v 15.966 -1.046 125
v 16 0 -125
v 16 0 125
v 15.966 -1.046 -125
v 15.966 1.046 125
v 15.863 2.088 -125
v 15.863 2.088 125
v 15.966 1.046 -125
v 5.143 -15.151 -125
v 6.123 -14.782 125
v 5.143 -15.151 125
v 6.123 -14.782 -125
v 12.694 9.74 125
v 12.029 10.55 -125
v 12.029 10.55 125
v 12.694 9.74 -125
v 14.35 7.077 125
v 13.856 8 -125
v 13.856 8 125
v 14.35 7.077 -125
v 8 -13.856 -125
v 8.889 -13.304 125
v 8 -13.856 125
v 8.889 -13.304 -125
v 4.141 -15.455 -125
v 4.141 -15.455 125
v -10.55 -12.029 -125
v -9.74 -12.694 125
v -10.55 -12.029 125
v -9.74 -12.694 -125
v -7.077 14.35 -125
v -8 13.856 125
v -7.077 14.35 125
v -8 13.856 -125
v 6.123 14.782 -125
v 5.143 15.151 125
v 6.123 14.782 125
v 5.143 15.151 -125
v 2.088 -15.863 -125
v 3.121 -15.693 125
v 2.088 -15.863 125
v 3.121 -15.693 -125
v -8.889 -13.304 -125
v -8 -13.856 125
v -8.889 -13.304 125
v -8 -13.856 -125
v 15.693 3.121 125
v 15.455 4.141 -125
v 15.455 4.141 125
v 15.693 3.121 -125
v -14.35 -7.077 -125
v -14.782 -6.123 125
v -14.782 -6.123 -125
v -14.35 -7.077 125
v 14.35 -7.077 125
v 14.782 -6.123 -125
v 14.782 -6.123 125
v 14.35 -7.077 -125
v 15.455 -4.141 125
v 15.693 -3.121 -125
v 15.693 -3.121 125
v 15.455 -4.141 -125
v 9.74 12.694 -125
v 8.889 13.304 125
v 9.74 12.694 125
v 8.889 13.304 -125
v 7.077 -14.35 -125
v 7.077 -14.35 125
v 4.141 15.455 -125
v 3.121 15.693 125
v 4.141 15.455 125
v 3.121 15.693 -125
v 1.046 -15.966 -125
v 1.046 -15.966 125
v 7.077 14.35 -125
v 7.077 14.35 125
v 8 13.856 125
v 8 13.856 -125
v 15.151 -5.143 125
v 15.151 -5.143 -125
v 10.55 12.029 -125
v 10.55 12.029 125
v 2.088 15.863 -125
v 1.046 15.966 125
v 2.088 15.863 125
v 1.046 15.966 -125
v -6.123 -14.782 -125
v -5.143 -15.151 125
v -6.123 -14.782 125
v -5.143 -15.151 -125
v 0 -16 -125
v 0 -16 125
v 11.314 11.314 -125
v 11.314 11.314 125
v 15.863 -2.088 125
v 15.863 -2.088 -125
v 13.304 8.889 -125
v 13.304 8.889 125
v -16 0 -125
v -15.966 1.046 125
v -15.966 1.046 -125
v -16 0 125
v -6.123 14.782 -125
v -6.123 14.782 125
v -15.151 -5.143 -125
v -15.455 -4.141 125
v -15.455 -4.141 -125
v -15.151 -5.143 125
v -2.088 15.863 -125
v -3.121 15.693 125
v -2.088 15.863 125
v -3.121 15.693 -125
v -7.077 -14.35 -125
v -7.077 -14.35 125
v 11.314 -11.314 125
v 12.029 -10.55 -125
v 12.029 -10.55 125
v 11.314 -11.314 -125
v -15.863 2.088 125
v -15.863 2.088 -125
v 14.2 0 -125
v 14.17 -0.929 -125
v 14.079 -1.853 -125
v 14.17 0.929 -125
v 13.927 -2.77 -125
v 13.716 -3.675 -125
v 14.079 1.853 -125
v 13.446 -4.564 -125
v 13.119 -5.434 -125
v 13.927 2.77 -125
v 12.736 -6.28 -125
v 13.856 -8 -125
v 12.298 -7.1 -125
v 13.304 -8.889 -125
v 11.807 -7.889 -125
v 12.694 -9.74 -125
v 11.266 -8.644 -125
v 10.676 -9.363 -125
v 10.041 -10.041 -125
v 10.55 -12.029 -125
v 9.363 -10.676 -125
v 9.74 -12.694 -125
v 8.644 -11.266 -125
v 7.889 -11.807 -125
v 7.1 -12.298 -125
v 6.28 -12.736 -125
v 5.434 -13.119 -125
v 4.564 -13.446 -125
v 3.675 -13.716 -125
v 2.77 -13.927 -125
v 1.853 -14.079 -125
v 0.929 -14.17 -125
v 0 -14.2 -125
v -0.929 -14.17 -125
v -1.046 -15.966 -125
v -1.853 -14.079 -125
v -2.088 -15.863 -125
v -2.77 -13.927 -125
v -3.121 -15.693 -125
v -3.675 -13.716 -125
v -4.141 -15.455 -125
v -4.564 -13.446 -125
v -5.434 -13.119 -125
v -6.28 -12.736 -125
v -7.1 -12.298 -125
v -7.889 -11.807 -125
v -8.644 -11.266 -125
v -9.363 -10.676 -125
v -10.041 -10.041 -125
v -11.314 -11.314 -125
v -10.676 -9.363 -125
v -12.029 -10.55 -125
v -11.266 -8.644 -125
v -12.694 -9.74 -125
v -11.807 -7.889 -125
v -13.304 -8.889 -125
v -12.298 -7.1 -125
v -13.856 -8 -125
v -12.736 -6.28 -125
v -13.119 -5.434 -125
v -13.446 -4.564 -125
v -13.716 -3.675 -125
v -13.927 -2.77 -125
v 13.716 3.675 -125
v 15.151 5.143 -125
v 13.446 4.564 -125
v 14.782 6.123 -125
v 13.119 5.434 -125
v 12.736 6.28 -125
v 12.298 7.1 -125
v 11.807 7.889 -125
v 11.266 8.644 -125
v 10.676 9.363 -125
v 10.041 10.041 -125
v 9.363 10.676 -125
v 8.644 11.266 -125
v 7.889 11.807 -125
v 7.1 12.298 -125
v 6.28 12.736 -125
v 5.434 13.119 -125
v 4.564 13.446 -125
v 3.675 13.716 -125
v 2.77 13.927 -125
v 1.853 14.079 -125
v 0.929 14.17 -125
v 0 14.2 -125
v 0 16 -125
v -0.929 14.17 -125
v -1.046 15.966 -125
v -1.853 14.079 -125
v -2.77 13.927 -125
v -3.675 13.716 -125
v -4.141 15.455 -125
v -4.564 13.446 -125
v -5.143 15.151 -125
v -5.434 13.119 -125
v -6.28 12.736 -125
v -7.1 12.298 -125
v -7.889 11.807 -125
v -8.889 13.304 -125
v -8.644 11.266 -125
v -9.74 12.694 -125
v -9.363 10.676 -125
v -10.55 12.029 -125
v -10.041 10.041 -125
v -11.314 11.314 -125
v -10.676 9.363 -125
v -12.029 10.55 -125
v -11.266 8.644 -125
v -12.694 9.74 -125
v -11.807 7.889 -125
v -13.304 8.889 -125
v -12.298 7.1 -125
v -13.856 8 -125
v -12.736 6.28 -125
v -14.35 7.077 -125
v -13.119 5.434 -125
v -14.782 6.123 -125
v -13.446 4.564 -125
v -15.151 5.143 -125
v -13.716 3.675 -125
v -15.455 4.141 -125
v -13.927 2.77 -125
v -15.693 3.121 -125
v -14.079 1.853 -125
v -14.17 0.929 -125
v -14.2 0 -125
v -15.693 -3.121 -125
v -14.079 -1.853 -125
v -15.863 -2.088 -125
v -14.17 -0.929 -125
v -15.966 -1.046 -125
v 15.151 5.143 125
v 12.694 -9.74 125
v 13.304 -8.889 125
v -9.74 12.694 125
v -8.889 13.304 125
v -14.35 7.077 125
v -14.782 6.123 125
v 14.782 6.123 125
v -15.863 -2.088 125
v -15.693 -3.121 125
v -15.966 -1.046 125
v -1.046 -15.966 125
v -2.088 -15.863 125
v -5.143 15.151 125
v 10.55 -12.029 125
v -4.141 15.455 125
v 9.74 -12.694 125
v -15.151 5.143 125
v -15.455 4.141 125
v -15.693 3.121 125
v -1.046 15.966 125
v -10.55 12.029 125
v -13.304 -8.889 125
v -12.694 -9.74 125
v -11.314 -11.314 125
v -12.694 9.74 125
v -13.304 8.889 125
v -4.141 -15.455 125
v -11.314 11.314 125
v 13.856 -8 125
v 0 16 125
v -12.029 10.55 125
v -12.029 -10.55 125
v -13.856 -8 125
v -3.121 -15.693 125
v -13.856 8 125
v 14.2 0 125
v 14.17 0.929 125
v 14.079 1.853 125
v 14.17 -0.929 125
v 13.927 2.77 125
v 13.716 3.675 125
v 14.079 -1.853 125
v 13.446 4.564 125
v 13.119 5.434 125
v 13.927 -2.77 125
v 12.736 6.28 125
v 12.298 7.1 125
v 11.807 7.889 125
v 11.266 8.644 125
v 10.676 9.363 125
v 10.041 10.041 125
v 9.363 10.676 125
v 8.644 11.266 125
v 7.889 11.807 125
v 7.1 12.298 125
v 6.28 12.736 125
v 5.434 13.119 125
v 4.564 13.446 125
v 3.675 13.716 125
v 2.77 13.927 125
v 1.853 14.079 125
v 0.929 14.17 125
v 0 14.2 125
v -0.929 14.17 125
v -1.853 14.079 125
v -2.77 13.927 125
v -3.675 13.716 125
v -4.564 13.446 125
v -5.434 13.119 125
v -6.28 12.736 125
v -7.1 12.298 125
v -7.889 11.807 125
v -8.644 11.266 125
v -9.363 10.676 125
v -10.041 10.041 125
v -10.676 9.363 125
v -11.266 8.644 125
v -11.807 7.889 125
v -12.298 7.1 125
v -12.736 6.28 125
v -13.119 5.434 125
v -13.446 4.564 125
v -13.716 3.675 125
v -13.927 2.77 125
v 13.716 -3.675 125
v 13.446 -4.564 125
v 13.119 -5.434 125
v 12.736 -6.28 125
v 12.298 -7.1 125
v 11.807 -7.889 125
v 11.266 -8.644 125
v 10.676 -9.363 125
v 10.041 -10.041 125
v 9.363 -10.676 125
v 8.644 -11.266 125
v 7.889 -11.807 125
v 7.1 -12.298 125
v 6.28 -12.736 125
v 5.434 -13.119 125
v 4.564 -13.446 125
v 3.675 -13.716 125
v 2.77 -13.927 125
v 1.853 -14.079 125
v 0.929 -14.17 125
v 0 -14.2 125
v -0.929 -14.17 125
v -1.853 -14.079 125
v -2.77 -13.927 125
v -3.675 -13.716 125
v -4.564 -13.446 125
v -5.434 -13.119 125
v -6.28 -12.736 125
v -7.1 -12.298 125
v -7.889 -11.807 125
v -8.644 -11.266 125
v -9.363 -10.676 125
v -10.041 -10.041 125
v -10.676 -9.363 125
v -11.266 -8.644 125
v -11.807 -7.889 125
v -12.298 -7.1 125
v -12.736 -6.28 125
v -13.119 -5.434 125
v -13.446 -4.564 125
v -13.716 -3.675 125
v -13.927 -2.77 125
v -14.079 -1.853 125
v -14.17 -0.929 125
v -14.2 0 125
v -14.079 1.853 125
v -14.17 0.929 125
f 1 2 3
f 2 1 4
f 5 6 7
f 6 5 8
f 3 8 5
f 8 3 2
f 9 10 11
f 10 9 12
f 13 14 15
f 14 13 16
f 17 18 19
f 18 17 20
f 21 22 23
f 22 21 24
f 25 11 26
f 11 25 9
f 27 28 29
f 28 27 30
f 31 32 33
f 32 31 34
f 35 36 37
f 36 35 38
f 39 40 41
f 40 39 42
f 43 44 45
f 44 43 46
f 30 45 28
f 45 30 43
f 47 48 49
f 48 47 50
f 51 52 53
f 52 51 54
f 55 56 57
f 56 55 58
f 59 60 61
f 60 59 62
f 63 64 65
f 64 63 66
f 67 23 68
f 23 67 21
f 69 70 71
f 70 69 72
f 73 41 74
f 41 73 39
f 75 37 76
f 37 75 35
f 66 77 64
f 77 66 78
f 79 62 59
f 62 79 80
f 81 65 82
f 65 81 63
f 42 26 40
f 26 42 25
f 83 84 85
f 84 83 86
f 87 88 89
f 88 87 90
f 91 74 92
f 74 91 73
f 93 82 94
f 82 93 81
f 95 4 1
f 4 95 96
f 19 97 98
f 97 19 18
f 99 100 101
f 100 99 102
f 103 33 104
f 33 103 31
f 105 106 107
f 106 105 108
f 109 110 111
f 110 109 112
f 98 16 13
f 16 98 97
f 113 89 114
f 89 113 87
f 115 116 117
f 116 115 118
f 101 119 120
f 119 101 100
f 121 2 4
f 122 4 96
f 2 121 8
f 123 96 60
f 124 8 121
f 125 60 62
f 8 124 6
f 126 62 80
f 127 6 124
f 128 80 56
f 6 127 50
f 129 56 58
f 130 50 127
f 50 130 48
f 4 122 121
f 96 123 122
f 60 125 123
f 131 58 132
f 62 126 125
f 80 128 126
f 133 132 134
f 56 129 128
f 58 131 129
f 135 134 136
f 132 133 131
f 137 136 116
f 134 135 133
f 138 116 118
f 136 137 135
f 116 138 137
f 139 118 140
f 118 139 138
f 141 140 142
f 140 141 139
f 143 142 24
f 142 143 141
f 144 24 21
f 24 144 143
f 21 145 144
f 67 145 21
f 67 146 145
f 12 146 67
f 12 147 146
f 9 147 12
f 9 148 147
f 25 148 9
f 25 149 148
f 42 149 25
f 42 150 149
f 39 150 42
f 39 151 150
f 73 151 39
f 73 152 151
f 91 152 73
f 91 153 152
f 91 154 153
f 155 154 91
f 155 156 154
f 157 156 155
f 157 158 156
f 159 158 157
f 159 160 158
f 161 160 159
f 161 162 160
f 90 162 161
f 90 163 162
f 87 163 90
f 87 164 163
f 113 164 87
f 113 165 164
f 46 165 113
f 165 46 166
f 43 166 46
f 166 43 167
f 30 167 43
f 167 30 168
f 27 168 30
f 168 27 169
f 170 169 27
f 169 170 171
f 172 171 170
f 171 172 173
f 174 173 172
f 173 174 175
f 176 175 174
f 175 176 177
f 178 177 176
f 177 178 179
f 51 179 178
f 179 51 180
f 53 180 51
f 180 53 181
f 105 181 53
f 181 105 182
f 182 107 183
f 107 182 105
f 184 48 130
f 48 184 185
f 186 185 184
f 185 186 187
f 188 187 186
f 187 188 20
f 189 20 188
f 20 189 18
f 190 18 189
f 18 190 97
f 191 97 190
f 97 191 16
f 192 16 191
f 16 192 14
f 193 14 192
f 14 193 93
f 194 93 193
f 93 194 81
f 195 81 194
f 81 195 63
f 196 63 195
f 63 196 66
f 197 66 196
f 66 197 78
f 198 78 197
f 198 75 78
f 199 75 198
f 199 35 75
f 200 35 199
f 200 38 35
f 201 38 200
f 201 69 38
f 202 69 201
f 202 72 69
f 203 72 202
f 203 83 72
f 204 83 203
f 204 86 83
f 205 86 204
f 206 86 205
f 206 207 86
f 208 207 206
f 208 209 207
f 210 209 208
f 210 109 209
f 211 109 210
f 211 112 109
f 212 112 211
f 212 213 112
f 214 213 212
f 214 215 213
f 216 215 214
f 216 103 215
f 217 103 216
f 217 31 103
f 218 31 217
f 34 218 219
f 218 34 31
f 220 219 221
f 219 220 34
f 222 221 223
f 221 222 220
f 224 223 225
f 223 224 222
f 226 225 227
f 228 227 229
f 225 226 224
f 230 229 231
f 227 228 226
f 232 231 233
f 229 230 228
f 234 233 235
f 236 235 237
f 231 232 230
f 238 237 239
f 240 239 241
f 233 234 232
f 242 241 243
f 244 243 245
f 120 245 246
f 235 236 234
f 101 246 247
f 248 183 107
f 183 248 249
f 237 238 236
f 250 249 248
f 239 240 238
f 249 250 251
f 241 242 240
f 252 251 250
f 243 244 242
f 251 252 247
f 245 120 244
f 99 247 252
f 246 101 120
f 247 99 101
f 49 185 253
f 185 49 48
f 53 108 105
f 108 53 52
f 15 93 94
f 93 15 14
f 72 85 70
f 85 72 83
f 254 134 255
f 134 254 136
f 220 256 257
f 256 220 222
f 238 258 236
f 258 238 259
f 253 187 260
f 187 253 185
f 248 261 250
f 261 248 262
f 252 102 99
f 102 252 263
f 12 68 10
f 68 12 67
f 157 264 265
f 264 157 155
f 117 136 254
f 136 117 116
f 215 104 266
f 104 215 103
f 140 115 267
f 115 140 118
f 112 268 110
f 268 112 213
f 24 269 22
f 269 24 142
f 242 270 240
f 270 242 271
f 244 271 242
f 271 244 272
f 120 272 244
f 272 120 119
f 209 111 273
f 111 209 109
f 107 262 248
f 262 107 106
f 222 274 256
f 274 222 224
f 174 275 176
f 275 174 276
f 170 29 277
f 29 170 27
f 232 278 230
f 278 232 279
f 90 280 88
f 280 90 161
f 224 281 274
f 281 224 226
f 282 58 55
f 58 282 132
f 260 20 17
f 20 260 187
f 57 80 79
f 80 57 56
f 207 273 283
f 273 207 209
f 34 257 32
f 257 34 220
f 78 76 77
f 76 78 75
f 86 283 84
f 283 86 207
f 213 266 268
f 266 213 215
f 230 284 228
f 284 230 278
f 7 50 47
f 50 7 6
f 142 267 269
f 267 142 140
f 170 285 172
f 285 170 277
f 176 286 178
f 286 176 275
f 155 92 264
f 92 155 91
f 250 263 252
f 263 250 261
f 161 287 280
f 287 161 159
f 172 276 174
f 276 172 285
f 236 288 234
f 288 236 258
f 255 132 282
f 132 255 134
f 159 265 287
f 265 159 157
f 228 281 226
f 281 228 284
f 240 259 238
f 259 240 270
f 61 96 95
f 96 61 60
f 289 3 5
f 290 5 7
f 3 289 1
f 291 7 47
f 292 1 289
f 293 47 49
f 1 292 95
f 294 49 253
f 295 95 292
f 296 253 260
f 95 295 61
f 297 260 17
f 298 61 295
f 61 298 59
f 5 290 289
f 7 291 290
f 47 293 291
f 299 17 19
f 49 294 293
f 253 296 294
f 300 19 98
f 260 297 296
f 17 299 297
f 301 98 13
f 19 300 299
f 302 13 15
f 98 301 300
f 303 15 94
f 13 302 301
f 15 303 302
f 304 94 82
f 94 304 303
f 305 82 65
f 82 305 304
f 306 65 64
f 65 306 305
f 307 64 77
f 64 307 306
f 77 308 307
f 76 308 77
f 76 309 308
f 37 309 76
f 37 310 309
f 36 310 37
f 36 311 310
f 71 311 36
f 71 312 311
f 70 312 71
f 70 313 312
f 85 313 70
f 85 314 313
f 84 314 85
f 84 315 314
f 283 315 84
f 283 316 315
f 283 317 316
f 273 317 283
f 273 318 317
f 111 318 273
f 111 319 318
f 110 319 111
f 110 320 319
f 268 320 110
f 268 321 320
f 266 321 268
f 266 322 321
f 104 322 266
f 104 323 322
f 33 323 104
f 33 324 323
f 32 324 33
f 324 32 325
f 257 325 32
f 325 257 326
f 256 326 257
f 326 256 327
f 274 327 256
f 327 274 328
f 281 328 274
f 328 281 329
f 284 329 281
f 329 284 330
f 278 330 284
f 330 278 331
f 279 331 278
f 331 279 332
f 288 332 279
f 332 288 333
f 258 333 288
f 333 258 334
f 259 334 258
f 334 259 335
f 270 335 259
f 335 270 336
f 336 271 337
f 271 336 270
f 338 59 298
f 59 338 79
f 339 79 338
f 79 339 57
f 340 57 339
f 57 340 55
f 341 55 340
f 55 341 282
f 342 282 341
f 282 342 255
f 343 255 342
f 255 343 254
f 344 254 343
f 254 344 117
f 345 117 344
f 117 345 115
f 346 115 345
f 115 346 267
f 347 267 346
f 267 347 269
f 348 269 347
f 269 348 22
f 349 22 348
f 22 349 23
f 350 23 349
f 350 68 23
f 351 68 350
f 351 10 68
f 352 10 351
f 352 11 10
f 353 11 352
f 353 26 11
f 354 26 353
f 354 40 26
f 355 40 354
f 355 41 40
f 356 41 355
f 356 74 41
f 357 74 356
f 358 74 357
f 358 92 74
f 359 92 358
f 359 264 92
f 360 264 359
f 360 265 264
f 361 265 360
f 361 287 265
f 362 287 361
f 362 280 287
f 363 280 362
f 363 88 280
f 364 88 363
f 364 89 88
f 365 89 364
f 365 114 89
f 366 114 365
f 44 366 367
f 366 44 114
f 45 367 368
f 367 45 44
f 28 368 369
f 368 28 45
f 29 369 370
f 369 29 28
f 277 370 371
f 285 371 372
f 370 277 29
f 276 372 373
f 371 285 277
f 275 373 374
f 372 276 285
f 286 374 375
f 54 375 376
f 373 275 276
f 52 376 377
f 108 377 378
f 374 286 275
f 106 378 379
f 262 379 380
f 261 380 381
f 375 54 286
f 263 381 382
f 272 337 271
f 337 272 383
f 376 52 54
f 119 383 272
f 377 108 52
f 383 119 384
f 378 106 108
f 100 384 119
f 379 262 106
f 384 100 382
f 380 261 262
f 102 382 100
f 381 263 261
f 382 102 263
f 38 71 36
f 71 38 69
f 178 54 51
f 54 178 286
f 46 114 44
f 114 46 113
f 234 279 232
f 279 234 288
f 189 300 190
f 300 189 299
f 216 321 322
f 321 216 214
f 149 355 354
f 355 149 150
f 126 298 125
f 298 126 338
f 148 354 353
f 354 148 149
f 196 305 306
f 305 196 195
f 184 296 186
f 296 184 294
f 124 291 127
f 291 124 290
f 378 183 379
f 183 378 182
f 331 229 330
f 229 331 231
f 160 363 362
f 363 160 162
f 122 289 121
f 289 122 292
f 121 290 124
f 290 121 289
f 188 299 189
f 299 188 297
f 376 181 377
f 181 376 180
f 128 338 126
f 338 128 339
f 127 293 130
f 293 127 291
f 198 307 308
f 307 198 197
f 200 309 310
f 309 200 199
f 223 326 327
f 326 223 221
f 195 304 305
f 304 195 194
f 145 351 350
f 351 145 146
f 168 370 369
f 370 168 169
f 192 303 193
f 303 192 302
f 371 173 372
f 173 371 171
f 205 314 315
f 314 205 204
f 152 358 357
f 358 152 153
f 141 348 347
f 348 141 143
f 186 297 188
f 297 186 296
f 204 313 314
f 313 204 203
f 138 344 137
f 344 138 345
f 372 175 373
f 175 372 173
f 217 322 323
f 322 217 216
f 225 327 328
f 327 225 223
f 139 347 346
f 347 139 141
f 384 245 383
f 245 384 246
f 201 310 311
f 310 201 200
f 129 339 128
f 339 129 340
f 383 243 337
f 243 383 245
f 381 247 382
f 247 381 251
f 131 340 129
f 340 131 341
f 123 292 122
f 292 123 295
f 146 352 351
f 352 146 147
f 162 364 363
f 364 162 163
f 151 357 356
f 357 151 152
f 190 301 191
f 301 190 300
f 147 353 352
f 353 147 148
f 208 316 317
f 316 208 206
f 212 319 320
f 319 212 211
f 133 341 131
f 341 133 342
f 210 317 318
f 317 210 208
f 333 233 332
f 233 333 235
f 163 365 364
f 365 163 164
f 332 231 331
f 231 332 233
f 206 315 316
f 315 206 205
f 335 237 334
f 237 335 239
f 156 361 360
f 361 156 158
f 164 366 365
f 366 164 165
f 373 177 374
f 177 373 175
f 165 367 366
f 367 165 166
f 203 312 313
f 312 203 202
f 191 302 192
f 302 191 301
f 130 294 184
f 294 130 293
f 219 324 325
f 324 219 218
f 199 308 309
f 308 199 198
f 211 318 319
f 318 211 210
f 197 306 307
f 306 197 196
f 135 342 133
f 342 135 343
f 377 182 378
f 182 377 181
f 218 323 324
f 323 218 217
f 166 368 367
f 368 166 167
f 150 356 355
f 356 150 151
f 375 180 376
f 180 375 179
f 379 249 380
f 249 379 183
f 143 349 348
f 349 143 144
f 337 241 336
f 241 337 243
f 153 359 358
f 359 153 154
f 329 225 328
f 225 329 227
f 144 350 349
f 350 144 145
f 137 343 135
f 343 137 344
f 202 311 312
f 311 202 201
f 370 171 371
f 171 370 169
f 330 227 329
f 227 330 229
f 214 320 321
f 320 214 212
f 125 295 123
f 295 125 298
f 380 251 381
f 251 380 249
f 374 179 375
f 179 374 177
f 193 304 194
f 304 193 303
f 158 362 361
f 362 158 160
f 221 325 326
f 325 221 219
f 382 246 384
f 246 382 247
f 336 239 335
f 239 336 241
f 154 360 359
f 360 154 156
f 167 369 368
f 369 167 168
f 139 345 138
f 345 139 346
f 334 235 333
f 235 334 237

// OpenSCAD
$fn=96;

module ht_pipe(od=32, wall=1.8, length=250) {
    difference() {
        translate([0,0,-length/2])
            cylinder(h=length, d=od);
        translate([0,0,-length/2-0.1])
            cylinder(h=length+0.2, d=od-2*wall);
    }
}

ht_pipe(od=32, wall=1.8, length=250);
